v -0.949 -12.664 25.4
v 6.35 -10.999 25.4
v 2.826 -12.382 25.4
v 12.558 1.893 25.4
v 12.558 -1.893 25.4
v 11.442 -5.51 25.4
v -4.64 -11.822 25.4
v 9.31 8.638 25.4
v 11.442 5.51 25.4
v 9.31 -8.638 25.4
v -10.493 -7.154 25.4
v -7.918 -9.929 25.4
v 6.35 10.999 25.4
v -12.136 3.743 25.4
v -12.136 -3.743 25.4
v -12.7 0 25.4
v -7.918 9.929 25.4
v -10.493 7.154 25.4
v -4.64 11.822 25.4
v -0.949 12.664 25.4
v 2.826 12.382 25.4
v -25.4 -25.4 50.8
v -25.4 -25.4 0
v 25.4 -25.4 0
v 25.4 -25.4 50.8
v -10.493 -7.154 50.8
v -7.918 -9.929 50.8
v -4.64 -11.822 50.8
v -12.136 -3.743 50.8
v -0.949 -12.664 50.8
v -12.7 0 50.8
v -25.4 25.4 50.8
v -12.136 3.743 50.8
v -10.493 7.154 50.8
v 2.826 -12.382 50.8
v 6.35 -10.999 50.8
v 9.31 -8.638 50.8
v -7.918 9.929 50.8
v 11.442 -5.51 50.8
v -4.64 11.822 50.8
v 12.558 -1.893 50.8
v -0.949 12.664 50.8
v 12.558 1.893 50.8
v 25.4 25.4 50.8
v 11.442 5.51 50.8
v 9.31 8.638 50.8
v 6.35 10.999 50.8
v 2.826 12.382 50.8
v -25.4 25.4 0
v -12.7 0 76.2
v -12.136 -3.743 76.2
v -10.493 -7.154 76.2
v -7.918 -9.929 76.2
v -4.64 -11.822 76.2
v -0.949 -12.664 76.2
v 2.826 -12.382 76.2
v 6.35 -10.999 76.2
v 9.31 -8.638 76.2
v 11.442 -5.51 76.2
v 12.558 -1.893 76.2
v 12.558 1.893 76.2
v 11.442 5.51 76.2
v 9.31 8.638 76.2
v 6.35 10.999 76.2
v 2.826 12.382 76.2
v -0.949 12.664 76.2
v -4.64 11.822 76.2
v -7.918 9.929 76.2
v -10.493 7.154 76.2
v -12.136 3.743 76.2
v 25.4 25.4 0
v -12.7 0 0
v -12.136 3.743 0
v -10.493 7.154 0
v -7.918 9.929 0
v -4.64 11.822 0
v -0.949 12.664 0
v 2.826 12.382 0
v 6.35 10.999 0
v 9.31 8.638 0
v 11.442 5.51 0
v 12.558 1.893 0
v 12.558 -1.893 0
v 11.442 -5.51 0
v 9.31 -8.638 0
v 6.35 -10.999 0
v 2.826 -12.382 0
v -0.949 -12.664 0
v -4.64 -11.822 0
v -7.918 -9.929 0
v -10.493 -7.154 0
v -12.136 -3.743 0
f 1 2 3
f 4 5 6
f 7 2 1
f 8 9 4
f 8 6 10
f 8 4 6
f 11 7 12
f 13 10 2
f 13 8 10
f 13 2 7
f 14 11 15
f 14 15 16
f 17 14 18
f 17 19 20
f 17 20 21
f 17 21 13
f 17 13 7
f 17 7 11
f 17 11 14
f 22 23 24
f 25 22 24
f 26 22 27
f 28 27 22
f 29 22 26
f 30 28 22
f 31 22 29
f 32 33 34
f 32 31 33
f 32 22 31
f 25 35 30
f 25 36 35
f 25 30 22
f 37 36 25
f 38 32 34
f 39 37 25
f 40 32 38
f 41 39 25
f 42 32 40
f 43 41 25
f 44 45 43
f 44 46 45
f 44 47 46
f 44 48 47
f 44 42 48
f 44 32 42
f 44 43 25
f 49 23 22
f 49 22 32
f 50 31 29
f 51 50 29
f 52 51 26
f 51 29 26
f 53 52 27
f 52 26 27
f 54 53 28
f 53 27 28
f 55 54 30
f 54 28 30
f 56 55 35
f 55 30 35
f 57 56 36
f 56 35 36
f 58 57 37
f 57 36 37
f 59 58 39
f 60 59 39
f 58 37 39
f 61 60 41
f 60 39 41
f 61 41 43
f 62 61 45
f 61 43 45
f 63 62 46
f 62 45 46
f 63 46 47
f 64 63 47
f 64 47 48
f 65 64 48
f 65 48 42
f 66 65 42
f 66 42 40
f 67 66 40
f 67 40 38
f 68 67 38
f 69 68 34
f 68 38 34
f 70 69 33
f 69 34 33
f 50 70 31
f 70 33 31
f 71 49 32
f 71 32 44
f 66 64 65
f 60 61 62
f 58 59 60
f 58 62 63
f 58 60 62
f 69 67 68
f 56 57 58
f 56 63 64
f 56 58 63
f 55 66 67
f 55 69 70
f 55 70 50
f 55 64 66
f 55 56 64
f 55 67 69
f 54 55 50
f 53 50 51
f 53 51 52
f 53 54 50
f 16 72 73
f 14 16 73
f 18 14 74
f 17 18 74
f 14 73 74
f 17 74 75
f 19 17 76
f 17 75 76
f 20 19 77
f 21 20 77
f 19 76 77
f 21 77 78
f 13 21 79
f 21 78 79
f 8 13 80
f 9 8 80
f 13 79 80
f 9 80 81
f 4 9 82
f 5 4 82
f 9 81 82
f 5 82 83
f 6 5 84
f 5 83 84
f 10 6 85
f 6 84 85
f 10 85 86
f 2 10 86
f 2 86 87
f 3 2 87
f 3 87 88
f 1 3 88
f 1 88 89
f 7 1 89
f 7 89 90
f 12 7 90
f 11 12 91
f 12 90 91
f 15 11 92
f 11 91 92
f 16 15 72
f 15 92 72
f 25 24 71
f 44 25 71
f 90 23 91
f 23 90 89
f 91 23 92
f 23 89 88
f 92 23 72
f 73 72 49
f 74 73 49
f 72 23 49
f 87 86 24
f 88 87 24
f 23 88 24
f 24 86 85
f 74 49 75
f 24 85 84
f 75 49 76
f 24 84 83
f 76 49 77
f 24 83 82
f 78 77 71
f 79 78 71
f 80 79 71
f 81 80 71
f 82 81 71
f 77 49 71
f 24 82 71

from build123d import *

# Parameters (mm, degrees)
SKETCH1_W           = 50.8
SKETCH1_H           = 50.8
BOSS_EXTRUDE1_DEPTH = 50.8
SKETCH2_R           = 12.7
BOSS_EXTRUDE2_DEPTH = 25.4
SKETCH3_R           = 12.7
CUT_EXTRUDE1_DEPTH  = 25.4


with BuildPart() as part:
    # Sketch1 → Boss-Extrude1 (new body)
    with BuildSketch(Plane.XY):
        Rectangle(SKETCH1_W, SKETCH1_H)
    extrude(amount=BOSS_EXTRUDE1_DEPTH)

    # Sketch2 → Boss-Extrude2 (add)
    with BuildSketch(Plane.XY.offset(50.8)):
        with Locations(Location((0, 0, 0), (0, 0, 180))):
            Circle(SKETCH2_R)
    extrude(amount=BOSS_EXTRUDE2_DEPTH)

    # Sketch3 → Cut-Extrude1 (cut)
    with BuildSketch(Plane(origin=(0, 0, 0), x_dir=(-1, 0, 0), z_dir=(0, 0, -1))):
        Circle(SKETCH3_R)
    extrude(amount=-CUT_EXTRUDE1_DEPTH, mode=Mode.SUBTRACT)


solid = part.part
